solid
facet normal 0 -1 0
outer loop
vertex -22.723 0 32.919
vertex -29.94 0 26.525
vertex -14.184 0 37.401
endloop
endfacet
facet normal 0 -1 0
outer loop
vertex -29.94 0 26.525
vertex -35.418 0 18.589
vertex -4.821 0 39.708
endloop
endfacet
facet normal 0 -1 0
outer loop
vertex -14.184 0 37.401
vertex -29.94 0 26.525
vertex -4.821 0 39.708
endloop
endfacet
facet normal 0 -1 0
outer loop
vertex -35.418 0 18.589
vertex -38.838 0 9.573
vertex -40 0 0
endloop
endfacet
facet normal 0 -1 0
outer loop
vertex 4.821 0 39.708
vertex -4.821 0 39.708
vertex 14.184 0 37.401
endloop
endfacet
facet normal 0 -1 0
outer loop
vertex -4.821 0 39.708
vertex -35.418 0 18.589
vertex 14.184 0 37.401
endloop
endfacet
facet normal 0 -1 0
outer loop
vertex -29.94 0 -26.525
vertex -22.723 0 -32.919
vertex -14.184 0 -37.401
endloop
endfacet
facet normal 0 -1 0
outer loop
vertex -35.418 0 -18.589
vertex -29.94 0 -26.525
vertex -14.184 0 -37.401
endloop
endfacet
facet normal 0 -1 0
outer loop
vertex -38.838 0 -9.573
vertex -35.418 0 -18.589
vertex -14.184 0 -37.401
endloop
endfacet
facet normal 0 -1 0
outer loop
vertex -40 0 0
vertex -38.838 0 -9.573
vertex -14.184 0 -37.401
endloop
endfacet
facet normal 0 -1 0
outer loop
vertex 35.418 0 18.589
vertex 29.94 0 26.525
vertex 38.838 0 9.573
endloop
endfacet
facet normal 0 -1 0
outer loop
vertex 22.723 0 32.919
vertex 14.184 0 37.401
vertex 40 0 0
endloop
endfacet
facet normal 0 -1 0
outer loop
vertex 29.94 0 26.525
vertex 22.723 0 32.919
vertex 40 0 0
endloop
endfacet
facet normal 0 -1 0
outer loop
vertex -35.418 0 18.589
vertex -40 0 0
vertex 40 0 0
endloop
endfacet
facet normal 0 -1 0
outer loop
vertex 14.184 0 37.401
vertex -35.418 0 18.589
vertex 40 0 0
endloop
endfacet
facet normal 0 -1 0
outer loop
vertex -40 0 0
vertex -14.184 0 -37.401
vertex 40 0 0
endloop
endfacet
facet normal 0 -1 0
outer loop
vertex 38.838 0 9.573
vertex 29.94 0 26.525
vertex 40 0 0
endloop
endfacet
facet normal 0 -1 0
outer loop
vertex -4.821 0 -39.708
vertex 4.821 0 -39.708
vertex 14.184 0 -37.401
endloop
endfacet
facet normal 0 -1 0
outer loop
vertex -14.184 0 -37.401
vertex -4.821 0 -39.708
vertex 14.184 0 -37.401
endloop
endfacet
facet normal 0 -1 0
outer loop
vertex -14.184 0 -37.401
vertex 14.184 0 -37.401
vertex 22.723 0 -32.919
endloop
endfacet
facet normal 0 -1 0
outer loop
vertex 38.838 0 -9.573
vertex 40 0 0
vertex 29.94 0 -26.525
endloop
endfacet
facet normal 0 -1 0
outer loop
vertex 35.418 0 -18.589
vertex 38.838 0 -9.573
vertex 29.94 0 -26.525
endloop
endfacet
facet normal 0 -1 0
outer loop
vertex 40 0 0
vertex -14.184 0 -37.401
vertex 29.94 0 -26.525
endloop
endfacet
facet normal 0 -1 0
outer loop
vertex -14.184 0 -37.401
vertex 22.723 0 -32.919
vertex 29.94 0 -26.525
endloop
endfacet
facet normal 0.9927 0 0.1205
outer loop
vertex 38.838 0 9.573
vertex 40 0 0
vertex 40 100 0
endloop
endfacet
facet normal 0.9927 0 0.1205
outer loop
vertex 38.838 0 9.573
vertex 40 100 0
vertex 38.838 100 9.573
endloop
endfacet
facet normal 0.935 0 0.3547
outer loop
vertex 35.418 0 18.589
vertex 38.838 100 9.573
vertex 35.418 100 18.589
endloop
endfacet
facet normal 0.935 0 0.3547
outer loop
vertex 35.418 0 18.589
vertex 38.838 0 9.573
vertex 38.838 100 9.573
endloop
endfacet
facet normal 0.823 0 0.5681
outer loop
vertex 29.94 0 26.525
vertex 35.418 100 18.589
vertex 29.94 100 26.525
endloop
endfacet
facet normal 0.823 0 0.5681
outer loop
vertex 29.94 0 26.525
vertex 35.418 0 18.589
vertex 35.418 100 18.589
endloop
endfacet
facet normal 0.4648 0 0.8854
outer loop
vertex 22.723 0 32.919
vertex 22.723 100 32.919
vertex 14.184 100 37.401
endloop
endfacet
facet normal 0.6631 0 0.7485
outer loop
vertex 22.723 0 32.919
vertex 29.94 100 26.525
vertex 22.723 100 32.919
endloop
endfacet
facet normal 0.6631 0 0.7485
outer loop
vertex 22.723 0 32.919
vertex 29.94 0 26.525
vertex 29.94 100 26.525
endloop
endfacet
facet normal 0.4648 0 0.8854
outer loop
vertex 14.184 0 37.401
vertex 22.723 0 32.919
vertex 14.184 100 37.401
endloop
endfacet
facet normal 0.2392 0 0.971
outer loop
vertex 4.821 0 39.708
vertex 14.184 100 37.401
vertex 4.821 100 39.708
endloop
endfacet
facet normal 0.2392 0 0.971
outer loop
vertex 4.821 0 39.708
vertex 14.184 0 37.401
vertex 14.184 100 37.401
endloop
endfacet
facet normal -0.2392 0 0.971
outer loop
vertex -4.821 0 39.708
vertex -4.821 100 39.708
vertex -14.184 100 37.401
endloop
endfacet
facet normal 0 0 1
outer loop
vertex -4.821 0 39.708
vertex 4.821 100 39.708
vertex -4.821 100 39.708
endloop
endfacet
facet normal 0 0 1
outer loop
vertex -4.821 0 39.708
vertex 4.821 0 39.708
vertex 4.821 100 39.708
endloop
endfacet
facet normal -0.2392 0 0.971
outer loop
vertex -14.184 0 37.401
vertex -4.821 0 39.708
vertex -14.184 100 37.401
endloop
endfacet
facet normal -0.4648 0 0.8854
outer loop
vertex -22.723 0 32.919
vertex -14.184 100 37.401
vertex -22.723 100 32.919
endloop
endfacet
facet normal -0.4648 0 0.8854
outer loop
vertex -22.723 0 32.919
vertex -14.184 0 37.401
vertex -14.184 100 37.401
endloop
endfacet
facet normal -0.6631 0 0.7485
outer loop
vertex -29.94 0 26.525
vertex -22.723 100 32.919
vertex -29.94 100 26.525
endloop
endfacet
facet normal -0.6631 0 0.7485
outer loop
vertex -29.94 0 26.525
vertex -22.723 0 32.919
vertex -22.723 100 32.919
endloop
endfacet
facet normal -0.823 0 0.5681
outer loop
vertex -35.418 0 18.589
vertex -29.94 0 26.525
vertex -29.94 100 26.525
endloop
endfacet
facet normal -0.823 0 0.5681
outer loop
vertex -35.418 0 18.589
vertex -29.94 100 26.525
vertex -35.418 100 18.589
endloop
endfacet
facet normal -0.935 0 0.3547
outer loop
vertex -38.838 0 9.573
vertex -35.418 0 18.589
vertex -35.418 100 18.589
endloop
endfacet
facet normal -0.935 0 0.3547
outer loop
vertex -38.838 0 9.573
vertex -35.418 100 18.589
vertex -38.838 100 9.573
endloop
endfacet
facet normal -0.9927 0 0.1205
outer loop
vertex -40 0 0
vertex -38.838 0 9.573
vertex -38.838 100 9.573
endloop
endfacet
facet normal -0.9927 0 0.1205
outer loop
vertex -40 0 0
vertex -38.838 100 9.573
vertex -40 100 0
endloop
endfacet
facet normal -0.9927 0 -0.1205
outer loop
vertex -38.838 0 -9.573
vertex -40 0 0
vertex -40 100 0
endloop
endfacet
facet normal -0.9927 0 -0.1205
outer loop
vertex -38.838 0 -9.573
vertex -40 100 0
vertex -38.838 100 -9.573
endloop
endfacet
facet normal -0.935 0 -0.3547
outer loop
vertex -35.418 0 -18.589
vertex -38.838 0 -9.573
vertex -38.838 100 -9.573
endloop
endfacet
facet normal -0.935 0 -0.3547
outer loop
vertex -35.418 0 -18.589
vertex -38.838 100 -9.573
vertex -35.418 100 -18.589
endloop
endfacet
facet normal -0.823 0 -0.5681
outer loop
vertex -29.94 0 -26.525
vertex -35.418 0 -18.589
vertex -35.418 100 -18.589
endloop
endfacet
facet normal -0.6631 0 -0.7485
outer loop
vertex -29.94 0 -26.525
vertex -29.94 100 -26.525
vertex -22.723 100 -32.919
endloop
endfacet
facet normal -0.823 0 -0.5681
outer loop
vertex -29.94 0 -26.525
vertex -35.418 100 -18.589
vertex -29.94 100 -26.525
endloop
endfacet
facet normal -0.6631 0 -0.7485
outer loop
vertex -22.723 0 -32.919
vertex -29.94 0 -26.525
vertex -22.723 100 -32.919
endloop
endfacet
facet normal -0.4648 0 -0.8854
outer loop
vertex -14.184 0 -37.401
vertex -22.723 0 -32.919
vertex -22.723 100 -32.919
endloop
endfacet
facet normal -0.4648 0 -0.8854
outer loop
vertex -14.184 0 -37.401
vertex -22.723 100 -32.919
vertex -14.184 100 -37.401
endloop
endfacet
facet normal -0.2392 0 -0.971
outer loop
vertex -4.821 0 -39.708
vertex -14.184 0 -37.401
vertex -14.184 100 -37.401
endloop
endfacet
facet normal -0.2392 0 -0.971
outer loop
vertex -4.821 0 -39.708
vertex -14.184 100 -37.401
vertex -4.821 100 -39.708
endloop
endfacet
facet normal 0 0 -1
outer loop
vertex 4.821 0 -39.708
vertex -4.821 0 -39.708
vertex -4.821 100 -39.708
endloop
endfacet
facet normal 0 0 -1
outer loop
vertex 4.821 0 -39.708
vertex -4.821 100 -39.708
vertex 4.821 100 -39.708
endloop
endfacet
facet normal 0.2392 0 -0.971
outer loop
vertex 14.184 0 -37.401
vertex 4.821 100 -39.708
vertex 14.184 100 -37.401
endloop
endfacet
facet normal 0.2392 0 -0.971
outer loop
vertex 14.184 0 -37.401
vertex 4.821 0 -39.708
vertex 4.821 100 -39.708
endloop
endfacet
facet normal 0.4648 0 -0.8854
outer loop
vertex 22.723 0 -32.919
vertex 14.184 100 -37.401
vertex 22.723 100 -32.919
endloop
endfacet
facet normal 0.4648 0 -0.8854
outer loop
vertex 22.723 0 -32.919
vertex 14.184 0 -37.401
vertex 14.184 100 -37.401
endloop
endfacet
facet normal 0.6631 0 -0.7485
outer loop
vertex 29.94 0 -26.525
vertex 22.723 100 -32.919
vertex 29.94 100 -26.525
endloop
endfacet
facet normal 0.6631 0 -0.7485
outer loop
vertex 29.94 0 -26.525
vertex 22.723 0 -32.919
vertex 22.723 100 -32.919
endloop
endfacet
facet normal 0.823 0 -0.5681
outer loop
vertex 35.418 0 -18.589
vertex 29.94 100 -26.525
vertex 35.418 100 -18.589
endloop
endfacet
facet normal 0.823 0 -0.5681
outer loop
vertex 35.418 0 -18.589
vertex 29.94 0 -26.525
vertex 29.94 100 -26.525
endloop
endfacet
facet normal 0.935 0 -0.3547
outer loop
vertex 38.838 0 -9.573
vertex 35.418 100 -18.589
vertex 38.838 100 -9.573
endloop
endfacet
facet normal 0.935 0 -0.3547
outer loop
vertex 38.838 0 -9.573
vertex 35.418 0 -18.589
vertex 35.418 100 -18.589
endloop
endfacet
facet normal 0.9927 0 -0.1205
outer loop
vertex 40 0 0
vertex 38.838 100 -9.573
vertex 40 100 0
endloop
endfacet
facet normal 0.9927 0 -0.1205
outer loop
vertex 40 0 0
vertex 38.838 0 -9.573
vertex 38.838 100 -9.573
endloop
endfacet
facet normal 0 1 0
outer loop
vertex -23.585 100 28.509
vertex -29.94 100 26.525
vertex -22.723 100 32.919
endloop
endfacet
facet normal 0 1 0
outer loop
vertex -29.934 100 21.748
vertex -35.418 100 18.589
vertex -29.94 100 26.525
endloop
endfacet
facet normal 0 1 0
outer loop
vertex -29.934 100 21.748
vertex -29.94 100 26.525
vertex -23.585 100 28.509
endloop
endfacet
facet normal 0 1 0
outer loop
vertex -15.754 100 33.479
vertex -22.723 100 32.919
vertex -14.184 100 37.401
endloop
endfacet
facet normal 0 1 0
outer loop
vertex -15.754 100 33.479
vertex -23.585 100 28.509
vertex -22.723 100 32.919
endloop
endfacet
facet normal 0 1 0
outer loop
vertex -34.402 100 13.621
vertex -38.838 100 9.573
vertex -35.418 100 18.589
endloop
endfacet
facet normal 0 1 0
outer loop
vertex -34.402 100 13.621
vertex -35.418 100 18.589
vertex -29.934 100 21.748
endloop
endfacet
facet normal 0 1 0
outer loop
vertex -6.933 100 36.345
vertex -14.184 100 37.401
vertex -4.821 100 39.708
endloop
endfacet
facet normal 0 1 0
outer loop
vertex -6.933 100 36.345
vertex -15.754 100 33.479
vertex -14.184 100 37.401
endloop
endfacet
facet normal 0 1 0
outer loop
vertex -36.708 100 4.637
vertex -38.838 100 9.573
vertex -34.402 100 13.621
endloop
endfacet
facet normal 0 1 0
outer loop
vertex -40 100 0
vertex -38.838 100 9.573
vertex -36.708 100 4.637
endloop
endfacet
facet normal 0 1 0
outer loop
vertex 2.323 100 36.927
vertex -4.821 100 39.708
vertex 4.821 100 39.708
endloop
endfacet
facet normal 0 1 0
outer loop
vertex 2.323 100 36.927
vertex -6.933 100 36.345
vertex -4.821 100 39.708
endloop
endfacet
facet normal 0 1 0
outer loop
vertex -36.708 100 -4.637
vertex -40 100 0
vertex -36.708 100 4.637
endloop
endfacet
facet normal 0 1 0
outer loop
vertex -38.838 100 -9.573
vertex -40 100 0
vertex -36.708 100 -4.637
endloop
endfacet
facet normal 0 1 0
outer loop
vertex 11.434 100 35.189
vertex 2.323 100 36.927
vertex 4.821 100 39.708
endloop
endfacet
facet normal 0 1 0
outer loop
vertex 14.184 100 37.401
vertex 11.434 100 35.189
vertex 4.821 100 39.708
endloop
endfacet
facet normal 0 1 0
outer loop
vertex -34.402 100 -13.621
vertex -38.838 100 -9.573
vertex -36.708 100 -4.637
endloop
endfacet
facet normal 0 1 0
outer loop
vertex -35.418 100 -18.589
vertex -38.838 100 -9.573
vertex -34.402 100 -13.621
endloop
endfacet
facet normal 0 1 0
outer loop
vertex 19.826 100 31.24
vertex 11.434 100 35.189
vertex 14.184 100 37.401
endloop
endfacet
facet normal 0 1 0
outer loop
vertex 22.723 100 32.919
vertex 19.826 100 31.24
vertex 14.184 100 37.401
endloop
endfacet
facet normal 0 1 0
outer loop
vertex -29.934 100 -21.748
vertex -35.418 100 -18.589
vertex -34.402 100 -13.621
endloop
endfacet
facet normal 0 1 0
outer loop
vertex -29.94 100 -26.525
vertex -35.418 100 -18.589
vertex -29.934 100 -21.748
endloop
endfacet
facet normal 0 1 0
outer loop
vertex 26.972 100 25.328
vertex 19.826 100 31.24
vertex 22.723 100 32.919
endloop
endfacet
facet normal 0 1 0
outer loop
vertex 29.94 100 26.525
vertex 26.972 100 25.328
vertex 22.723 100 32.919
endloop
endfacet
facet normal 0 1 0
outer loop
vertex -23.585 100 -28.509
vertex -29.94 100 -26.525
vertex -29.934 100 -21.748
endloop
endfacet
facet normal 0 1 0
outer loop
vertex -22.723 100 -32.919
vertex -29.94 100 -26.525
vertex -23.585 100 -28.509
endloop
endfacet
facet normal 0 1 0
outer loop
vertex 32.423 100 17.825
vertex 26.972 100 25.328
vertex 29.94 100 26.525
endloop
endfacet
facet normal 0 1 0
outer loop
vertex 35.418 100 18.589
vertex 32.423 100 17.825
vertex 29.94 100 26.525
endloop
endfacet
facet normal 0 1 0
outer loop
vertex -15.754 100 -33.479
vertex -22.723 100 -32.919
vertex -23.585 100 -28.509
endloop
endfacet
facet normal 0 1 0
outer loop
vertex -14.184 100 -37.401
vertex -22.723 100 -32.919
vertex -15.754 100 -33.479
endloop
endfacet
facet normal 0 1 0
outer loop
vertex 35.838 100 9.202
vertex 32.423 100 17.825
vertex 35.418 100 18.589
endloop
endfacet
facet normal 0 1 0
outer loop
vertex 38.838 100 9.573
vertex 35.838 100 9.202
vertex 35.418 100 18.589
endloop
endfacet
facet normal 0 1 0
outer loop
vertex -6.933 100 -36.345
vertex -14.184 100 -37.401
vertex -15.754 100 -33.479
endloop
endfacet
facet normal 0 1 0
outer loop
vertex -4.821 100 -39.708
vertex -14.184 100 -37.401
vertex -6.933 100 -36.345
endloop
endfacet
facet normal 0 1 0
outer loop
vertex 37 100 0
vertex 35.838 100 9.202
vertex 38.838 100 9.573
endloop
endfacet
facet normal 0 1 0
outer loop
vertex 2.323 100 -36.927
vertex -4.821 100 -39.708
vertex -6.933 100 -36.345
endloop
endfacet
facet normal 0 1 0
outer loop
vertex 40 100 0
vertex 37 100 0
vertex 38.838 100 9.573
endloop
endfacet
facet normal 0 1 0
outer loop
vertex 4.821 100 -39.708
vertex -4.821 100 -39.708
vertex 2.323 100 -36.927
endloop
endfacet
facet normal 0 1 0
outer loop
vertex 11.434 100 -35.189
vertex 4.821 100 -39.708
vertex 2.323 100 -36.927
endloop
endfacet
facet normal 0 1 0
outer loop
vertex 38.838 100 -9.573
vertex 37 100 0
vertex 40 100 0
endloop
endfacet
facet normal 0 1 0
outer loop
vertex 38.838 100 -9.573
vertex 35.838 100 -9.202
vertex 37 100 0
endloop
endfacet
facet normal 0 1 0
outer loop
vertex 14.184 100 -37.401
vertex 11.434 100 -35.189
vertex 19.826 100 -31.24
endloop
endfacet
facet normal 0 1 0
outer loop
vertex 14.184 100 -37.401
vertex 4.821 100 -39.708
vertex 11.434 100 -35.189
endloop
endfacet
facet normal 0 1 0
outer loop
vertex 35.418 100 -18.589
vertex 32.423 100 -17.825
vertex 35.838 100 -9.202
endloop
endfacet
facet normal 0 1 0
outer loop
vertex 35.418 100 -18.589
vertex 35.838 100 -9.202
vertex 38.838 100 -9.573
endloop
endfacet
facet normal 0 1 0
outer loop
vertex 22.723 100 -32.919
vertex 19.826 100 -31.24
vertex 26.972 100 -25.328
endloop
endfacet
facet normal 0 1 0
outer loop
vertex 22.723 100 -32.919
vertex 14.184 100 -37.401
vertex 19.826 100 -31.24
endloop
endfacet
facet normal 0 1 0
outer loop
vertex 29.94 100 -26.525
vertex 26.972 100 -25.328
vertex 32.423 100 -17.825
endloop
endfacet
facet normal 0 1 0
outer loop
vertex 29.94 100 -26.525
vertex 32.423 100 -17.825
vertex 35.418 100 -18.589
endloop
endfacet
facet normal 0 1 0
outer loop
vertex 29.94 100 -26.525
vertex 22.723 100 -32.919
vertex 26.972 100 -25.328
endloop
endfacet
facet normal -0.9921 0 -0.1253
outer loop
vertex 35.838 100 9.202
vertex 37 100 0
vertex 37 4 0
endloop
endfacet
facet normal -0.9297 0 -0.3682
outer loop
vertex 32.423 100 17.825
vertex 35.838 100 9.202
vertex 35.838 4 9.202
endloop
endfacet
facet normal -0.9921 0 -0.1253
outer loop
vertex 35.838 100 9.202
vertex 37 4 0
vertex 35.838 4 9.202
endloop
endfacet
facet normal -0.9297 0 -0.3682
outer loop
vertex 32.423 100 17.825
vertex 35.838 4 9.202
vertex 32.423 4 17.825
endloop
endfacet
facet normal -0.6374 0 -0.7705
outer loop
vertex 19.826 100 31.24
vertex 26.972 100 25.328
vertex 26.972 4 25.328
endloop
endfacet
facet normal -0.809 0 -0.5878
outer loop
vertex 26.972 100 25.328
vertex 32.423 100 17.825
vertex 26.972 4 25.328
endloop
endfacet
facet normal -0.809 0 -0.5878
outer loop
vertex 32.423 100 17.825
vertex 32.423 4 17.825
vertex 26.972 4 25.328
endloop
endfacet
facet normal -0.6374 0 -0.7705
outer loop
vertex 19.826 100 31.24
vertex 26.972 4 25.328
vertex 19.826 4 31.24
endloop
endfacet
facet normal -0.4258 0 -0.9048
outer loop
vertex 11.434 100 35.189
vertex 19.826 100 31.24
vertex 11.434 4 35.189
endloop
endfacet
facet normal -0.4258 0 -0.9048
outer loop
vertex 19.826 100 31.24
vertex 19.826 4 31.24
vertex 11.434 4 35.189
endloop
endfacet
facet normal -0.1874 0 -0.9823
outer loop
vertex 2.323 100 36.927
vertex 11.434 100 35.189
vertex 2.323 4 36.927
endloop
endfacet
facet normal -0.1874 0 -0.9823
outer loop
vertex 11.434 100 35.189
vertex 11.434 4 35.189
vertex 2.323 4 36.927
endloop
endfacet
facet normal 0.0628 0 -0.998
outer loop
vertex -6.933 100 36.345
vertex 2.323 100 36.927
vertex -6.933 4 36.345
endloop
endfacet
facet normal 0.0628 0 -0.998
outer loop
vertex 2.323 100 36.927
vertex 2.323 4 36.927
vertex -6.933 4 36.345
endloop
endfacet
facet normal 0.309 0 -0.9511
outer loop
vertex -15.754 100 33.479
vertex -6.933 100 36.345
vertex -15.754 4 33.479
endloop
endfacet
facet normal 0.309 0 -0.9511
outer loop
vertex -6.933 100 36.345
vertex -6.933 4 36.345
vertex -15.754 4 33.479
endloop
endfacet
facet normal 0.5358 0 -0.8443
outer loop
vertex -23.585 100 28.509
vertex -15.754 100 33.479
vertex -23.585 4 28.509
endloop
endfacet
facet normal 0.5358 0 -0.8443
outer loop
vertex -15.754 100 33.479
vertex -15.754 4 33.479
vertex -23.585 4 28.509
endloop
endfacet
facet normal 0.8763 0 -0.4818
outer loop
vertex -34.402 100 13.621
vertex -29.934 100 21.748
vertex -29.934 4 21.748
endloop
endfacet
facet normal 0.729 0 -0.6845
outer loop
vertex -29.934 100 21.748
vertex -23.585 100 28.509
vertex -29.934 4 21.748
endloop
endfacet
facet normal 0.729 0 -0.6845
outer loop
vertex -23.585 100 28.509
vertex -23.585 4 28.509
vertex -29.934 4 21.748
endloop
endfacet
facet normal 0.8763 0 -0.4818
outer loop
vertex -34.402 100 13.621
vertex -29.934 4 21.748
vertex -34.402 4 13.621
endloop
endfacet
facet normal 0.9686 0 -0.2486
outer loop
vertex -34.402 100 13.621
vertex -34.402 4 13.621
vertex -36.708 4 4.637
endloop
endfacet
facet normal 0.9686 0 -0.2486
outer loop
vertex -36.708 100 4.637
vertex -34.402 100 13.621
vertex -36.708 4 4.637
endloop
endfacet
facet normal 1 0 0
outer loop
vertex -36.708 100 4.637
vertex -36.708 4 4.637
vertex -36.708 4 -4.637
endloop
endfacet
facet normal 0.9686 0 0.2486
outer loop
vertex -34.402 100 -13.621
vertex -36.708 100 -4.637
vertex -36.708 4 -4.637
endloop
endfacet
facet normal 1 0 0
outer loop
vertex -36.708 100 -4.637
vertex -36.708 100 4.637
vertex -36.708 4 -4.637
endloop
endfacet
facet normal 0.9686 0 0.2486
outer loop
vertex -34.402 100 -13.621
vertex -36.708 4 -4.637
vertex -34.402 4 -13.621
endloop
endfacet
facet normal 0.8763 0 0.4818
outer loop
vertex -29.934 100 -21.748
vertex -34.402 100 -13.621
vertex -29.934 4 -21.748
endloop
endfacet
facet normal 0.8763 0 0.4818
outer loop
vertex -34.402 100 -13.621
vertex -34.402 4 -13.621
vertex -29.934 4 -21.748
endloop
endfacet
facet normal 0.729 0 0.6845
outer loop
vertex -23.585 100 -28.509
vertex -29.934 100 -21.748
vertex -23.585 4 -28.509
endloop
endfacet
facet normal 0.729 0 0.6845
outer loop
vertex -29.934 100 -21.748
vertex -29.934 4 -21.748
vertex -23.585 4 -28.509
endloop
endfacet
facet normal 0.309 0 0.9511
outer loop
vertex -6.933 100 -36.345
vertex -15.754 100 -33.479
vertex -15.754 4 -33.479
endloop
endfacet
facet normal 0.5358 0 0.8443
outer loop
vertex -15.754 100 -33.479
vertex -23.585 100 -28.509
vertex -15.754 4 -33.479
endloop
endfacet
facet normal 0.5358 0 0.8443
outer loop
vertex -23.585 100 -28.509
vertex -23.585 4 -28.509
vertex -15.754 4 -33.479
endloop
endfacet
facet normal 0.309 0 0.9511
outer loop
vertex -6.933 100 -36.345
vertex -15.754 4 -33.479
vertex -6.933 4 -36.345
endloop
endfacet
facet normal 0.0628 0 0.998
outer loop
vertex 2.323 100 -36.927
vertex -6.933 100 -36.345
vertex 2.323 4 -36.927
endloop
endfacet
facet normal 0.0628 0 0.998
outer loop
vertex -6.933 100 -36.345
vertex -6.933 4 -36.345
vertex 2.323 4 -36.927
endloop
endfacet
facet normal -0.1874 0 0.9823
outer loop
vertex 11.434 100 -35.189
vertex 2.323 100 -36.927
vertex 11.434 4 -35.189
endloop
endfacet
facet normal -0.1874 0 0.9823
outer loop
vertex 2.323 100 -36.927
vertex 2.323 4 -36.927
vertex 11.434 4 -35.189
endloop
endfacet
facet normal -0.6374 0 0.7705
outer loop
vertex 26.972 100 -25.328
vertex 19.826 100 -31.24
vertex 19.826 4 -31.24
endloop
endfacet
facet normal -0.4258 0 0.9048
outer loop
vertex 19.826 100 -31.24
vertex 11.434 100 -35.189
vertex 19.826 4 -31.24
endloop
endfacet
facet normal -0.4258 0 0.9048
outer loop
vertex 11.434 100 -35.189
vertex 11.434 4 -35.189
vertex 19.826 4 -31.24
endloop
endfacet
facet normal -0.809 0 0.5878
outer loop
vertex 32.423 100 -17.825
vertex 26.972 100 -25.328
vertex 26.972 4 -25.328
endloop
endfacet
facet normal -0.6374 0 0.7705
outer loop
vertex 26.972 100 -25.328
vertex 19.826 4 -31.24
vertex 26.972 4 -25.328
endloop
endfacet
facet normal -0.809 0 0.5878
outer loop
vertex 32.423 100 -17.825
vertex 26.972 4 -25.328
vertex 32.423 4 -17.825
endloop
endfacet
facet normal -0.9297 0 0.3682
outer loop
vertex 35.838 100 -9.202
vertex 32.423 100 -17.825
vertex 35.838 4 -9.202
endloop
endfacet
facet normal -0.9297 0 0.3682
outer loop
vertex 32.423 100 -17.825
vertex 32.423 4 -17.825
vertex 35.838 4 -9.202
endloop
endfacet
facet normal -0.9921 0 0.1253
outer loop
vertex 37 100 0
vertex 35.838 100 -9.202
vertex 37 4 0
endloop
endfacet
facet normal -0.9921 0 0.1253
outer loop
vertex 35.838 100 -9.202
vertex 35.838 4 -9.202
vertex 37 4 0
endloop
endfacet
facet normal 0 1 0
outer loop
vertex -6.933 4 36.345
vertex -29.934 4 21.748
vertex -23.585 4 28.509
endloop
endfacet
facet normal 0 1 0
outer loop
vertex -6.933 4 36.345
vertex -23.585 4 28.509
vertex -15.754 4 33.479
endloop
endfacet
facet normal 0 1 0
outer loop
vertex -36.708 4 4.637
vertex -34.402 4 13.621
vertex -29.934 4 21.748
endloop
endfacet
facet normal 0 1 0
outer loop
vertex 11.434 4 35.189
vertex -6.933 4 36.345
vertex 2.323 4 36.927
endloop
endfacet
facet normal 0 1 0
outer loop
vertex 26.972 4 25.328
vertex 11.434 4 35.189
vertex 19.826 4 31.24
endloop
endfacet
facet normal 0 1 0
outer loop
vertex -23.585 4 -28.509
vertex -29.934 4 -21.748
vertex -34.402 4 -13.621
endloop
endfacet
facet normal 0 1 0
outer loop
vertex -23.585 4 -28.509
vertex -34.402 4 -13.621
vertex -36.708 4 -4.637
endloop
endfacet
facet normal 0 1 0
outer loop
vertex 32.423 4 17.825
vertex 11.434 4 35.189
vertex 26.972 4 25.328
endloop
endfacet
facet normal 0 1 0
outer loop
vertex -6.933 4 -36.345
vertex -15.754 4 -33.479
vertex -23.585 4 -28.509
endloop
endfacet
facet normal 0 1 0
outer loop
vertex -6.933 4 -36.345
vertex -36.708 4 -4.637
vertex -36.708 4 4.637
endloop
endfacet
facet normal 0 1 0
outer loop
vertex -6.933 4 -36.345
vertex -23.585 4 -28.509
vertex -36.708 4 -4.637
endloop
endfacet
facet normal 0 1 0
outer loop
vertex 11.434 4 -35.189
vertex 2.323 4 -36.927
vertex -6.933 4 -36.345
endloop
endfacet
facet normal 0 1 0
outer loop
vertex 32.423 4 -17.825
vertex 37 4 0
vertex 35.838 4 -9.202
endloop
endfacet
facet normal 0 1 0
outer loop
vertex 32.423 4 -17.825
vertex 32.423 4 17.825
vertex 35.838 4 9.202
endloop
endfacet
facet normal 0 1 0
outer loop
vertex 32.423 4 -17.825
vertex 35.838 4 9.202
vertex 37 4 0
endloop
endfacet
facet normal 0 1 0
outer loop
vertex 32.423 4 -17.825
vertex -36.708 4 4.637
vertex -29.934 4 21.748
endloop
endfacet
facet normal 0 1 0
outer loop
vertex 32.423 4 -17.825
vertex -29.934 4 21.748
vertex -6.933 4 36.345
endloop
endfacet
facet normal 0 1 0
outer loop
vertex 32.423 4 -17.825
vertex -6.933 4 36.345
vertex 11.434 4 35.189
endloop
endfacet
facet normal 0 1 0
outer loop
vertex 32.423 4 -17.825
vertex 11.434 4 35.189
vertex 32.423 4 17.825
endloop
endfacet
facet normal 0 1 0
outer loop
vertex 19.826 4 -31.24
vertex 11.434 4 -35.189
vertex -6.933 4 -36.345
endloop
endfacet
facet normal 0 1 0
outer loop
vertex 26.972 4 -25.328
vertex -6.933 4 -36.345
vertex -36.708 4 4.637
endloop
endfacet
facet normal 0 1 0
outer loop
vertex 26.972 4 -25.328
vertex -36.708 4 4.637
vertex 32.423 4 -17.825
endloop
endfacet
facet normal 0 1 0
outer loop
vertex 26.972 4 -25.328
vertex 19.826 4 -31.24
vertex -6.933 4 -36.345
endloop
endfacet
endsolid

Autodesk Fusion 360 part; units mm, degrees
sketch "Sketch1" plane through (0, 0, 0) normal (0, 1, 0) x (1, 0, 0)
  circle A0 centre (0, 0) radius 40
  circle A1 centre (0, 0) radius 37
  dimension "d1" = 80
  dimension "d7" = 3
extrude "Extrude1" add sketch "Sketch1" along normal blind 100 makes body 1
extrude "Extrude2" add sketch "Sketch1" along normal blind 4 contours A1 bodies 1
copy_body "Body->Comp1" bodies 1 removing the originals makes body 2 in component "tubeToolHolder05"
component "tubeToolHolder05" placed x (1, 0, 0) y (0, 1, 0) z (0, 0, 1) at (0, 0, 0)
